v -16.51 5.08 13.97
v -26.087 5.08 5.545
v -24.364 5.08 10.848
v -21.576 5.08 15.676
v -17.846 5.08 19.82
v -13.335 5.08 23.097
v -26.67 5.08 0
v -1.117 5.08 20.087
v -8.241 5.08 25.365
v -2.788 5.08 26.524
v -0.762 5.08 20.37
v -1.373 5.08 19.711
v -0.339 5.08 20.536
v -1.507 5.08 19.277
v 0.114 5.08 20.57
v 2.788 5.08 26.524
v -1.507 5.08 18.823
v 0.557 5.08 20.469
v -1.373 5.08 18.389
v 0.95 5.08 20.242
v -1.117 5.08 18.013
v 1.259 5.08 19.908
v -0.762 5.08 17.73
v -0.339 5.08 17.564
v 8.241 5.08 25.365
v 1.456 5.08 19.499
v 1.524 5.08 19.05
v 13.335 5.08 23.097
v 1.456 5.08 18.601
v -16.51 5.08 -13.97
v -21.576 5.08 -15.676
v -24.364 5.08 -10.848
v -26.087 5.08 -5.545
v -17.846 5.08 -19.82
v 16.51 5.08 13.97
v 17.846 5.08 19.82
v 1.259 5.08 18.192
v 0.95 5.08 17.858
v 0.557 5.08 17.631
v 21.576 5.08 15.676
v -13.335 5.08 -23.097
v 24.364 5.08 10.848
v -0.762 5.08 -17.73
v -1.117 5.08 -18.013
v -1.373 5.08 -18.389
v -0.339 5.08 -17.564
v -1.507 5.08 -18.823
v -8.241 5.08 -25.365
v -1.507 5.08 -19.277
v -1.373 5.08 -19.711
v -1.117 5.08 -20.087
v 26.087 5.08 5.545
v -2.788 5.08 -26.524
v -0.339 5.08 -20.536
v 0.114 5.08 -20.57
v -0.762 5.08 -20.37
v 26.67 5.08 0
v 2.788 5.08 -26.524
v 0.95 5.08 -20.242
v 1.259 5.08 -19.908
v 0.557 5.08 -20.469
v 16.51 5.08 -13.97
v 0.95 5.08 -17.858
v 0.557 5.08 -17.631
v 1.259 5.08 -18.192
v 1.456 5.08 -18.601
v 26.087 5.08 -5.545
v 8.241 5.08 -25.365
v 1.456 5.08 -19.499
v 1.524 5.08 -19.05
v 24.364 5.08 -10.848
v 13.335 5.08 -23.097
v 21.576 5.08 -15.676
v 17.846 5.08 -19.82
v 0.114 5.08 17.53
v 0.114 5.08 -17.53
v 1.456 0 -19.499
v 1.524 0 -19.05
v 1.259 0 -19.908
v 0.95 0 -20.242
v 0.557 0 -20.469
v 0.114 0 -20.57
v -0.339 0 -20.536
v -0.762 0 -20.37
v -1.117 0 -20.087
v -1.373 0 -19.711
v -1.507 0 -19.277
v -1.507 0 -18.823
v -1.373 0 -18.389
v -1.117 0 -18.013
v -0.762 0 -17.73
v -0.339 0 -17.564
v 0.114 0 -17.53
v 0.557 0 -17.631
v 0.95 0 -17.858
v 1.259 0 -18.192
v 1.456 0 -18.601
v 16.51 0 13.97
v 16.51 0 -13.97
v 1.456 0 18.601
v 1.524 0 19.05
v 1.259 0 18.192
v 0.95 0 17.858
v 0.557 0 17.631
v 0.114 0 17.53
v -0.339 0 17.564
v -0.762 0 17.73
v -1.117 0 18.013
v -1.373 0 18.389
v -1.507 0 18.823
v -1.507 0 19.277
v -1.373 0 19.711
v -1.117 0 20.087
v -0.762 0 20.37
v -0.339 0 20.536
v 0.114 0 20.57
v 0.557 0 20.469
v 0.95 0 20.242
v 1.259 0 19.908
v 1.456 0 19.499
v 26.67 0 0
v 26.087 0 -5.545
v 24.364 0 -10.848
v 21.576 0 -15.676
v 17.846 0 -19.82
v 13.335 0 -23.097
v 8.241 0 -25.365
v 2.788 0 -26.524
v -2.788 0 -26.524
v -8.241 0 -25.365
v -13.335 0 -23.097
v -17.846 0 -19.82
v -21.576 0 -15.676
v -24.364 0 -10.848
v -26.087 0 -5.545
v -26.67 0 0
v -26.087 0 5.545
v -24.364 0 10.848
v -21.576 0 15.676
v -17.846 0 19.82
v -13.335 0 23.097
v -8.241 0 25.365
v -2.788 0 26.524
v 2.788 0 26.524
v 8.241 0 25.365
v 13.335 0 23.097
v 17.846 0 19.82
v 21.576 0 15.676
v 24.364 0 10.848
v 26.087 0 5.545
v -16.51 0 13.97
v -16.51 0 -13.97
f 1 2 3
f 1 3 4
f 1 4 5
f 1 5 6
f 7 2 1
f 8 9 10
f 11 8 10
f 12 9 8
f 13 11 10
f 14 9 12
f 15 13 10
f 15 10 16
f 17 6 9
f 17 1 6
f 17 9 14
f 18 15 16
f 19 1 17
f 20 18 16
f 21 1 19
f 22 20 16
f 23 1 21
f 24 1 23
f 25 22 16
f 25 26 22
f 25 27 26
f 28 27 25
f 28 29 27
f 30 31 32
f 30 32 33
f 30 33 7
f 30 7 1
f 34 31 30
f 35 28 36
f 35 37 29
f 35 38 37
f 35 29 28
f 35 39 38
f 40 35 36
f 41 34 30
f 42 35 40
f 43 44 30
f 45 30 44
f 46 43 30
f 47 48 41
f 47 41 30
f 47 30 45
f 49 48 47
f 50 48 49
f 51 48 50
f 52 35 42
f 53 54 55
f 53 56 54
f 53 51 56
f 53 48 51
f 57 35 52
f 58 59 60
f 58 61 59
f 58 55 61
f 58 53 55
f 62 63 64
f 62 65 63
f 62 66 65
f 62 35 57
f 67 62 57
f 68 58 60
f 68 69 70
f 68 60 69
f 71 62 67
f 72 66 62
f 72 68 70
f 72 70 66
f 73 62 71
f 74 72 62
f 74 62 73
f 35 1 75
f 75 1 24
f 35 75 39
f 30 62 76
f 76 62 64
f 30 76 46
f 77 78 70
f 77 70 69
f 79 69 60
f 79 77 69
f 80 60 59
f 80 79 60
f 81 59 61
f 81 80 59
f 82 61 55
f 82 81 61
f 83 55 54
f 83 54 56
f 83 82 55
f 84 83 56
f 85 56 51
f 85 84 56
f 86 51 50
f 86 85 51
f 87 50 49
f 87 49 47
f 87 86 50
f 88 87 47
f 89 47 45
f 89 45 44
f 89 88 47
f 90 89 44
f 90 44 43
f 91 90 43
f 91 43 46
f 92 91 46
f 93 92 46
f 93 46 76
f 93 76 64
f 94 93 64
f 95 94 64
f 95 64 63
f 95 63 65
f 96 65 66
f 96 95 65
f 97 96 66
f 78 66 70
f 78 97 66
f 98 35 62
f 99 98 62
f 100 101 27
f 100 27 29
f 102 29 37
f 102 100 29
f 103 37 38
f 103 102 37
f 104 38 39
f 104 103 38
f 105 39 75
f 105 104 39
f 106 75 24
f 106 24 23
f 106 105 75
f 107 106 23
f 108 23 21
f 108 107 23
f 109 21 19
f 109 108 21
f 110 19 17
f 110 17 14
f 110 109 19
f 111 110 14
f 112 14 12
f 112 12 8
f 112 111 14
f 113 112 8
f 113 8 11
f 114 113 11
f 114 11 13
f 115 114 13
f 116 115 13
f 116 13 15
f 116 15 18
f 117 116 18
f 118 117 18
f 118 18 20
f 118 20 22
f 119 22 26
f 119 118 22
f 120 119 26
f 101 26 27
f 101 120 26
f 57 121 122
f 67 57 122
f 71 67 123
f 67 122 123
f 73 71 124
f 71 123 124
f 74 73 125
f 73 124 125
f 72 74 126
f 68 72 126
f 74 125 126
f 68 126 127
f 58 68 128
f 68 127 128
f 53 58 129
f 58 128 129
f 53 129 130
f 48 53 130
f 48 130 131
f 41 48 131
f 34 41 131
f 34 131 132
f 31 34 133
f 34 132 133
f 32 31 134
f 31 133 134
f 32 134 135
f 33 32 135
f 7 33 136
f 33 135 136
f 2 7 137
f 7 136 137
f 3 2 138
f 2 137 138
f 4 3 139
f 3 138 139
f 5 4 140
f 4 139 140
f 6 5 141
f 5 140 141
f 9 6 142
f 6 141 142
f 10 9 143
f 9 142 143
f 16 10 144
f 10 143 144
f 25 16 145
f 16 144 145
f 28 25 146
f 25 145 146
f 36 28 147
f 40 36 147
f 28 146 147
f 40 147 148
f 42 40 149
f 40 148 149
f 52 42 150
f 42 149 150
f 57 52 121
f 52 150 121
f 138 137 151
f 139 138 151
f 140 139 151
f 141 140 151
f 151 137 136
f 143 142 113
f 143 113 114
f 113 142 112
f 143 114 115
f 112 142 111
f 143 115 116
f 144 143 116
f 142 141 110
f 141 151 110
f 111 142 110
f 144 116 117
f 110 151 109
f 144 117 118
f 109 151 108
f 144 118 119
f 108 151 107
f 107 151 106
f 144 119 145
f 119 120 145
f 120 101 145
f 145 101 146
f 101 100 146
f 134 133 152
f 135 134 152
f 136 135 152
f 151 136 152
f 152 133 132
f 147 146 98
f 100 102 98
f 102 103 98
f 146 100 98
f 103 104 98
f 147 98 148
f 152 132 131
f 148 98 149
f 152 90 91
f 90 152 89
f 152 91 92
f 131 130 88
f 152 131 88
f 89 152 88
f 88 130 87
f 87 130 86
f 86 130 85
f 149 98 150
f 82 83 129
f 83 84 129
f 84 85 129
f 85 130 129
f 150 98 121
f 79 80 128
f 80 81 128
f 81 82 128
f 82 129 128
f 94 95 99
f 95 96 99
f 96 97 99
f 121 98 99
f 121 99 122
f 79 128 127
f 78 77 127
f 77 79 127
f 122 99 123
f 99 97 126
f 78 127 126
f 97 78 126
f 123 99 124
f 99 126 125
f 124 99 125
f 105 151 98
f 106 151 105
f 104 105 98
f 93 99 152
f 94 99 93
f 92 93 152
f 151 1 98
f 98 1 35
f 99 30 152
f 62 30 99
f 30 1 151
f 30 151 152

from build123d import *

# Parameters (mm, degrees)
SKETCH1_R           = 26.67
SKETCH1_R_2         = 1.524
BOSS_EXTRUDE2_DEPTH = 5.08
SKETCH4_W           = 33.02
SKETCH4_H           = 27.94
CUT_EXTRUDE1_DEPTH  = 6.08


with BuildPart() as part:
    # Sketch1 → Boss-Extrude2 (new body)
    with BuildSketch(Plane(origin=(0, 0, 0), x_dir=(1, 0, 0), z_dir=(0, 1, 0))):
        Circle(SKETCH1_R)
        with Locations((0, -19.05)):
            Circle(SKETCH1_R_2, mode=Mode.SUBTRACT)
        with Locations((0, 19.05)):
            Circle(SKETCH1_R_2, mode=Mode.SUBTRACT)
    extrude(amount=BOSS_EXTRUDE2_DEPTH)

    # Sketch4 → Cut-Extrude1 (cut, through all)
    with BuildSketch(Plane(origin=(0, 5.08, 0), x_dir=(1, 0, 0), z_dir=(0, 1, 0))):
        Rectangle(SKETCH4_W, SKETCH4_H)
    extrude(amount=-CUT_EXTRUDE1_DEPTH, mode=Mode.SUBTRACT)


solid = part.part
